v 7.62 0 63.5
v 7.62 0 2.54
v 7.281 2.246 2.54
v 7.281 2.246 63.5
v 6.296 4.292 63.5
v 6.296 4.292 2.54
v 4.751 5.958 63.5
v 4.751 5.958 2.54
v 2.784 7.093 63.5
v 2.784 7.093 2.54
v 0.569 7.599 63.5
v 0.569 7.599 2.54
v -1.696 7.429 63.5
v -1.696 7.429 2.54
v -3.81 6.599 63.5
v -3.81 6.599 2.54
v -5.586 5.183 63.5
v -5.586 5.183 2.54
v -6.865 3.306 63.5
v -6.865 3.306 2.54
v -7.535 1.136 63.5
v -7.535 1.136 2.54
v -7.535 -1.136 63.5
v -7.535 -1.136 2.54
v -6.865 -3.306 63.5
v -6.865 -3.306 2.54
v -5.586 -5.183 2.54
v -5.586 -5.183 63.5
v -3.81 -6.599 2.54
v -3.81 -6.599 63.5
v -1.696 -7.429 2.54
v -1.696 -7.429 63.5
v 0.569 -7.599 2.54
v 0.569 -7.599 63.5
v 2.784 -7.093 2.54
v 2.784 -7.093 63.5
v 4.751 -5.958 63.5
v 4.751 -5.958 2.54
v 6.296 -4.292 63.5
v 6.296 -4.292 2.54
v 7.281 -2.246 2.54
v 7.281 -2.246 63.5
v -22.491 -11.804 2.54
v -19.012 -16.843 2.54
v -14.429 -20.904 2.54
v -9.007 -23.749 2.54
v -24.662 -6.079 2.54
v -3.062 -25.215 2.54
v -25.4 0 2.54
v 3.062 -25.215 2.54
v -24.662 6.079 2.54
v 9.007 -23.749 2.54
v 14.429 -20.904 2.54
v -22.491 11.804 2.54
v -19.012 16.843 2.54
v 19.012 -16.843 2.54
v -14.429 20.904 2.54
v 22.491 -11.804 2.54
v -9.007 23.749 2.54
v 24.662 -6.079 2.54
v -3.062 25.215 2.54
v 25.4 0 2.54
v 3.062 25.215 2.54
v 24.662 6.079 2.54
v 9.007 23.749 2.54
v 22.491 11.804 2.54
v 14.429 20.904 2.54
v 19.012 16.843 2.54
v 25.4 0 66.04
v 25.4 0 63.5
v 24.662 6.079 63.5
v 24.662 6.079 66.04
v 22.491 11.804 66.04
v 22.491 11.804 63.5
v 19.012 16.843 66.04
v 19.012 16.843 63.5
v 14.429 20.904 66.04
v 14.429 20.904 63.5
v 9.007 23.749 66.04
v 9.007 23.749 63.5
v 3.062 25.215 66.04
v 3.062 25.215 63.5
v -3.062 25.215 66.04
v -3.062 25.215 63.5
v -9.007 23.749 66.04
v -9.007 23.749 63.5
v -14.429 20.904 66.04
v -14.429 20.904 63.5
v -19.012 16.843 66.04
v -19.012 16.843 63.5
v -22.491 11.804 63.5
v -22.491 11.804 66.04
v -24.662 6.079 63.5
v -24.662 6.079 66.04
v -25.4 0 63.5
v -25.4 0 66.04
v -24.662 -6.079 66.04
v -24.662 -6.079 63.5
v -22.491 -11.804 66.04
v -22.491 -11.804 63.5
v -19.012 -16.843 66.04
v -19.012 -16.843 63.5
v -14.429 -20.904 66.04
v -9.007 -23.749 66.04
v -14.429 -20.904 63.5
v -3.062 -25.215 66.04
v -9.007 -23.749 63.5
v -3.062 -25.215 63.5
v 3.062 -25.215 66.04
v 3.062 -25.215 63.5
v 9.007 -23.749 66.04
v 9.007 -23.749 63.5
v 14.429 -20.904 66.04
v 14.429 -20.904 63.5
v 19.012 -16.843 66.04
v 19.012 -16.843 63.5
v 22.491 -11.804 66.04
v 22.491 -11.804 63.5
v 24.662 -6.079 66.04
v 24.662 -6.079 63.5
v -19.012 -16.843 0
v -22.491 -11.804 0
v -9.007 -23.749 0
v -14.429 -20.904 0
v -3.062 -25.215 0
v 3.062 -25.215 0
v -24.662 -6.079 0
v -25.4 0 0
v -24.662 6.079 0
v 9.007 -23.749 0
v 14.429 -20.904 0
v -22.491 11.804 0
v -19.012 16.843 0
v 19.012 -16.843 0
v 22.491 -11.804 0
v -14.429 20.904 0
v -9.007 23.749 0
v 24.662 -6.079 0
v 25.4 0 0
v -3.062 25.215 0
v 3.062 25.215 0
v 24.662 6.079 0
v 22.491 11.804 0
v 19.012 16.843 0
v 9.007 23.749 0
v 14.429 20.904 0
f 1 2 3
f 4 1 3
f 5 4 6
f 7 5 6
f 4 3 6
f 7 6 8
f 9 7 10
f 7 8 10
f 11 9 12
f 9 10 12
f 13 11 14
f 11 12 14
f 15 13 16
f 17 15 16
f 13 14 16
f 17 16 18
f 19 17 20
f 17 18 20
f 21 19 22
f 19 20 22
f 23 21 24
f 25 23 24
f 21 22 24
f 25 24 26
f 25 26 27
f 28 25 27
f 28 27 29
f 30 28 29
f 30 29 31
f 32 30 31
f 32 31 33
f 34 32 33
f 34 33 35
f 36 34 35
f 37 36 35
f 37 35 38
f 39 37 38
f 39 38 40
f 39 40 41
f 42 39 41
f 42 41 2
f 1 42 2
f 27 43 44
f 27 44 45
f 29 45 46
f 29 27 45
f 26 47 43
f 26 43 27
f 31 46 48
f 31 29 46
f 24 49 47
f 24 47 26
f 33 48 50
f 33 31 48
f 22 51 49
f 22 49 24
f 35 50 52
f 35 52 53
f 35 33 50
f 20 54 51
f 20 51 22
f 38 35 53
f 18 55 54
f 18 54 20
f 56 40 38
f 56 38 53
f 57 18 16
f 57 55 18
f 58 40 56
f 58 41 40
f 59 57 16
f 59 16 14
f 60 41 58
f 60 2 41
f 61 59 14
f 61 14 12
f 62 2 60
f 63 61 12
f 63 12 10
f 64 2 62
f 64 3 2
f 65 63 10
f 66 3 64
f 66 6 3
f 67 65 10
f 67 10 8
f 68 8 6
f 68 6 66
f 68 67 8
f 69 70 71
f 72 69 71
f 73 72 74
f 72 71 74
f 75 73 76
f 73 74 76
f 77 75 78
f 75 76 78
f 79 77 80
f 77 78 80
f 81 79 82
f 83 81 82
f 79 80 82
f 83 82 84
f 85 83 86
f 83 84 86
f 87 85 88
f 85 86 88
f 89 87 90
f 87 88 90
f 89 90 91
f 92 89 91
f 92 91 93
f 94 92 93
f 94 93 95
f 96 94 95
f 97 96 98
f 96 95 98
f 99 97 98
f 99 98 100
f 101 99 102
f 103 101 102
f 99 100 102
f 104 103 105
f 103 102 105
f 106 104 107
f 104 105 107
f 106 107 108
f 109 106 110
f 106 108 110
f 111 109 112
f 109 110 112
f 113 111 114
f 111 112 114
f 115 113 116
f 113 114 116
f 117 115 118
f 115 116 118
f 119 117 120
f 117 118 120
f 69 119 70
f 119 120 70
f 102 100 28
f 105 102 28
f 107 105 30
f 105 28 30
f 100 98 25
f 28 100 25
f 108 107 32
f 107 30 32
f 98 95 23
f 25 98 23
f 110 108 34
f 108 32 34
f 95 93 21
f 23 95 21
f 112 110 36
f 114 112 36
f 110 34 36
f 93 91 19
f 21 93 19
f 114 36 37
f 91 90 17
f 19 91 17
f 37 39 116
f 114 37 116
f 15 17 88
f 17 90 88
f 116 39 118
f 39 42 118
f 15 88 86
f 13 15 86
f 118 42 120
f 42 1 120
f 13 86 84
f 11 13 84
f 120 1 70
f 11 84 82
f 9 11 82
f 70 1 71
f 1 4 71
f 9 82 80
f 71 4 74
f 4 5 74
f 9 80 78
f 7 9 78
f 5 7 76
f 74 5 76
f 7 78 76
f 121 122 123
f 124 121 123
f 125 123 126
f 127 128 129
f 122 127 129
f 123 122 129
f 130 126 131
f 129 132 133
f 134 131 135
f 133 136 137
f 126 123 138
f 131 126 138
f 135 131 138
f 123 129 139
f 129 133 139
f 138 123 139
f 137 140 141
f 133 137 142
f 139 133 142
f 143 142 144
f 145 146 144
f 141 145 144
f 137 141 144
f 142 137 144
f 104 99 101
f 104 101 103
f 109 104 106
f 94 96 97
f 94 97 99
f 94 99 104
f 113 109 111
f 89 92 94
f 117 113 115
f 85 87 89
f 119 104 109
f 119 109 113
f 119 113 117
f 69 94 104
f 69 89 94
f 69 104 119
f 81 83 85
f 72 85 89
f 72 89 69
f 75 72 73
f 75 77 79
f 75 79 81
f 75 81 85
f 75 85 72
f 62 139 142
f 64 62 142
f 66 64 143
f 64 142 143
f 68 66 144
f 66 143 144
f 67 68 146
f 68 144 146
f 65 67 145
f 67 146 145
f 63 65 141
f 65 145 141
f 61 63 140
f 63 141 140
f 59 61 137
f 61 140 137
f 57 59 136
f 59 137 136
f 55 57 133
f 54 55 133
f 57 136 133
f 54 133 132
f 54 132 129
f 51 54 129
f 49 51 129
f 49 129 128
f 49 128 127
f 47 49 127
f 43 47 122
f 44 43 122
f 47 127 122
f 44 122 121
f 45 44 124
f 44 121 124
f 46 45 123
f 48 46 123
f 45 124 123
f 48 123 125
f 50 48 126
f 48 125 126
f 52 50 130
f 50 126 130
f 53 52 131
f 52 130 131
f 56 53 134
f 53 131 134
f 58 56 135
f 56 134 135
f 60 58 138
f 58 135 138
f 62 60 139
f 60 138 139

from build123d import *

# Parameters (mm, degrees)
F0_R     = 25.4
F0_R_2   = 7.62
F1_DEPTH = 2.54
F2_DEPTH = 63.5
F3_R     = 25.4
F3_R_2   = 7.62
F4_DEPTH = 2.54


with BuildPart() as f1:
    # F0 (on Top) → F1 (new body)
    with BuildSketch(Plane.XY):
        Circle(F0_R)
        Circle(F0_R_2, mode=Mode.SUBTRACT)
    extrude(amount=F1_DEPTH)

    # F0 (on Top) → F2 (join)
    with BuildSketch(Plane.XY):
        Circle(F0_R_2)
    extrude(amount=F2_DEPTH)

    # F3 (on face) → F4 (join)
    with BuildSketch(Plane.XY.offset(63.5)):
        Circle(F3_R)
        Circle(F3_R_2)
    extrude(amount=F4_DEPTH)


solid = f1.part
